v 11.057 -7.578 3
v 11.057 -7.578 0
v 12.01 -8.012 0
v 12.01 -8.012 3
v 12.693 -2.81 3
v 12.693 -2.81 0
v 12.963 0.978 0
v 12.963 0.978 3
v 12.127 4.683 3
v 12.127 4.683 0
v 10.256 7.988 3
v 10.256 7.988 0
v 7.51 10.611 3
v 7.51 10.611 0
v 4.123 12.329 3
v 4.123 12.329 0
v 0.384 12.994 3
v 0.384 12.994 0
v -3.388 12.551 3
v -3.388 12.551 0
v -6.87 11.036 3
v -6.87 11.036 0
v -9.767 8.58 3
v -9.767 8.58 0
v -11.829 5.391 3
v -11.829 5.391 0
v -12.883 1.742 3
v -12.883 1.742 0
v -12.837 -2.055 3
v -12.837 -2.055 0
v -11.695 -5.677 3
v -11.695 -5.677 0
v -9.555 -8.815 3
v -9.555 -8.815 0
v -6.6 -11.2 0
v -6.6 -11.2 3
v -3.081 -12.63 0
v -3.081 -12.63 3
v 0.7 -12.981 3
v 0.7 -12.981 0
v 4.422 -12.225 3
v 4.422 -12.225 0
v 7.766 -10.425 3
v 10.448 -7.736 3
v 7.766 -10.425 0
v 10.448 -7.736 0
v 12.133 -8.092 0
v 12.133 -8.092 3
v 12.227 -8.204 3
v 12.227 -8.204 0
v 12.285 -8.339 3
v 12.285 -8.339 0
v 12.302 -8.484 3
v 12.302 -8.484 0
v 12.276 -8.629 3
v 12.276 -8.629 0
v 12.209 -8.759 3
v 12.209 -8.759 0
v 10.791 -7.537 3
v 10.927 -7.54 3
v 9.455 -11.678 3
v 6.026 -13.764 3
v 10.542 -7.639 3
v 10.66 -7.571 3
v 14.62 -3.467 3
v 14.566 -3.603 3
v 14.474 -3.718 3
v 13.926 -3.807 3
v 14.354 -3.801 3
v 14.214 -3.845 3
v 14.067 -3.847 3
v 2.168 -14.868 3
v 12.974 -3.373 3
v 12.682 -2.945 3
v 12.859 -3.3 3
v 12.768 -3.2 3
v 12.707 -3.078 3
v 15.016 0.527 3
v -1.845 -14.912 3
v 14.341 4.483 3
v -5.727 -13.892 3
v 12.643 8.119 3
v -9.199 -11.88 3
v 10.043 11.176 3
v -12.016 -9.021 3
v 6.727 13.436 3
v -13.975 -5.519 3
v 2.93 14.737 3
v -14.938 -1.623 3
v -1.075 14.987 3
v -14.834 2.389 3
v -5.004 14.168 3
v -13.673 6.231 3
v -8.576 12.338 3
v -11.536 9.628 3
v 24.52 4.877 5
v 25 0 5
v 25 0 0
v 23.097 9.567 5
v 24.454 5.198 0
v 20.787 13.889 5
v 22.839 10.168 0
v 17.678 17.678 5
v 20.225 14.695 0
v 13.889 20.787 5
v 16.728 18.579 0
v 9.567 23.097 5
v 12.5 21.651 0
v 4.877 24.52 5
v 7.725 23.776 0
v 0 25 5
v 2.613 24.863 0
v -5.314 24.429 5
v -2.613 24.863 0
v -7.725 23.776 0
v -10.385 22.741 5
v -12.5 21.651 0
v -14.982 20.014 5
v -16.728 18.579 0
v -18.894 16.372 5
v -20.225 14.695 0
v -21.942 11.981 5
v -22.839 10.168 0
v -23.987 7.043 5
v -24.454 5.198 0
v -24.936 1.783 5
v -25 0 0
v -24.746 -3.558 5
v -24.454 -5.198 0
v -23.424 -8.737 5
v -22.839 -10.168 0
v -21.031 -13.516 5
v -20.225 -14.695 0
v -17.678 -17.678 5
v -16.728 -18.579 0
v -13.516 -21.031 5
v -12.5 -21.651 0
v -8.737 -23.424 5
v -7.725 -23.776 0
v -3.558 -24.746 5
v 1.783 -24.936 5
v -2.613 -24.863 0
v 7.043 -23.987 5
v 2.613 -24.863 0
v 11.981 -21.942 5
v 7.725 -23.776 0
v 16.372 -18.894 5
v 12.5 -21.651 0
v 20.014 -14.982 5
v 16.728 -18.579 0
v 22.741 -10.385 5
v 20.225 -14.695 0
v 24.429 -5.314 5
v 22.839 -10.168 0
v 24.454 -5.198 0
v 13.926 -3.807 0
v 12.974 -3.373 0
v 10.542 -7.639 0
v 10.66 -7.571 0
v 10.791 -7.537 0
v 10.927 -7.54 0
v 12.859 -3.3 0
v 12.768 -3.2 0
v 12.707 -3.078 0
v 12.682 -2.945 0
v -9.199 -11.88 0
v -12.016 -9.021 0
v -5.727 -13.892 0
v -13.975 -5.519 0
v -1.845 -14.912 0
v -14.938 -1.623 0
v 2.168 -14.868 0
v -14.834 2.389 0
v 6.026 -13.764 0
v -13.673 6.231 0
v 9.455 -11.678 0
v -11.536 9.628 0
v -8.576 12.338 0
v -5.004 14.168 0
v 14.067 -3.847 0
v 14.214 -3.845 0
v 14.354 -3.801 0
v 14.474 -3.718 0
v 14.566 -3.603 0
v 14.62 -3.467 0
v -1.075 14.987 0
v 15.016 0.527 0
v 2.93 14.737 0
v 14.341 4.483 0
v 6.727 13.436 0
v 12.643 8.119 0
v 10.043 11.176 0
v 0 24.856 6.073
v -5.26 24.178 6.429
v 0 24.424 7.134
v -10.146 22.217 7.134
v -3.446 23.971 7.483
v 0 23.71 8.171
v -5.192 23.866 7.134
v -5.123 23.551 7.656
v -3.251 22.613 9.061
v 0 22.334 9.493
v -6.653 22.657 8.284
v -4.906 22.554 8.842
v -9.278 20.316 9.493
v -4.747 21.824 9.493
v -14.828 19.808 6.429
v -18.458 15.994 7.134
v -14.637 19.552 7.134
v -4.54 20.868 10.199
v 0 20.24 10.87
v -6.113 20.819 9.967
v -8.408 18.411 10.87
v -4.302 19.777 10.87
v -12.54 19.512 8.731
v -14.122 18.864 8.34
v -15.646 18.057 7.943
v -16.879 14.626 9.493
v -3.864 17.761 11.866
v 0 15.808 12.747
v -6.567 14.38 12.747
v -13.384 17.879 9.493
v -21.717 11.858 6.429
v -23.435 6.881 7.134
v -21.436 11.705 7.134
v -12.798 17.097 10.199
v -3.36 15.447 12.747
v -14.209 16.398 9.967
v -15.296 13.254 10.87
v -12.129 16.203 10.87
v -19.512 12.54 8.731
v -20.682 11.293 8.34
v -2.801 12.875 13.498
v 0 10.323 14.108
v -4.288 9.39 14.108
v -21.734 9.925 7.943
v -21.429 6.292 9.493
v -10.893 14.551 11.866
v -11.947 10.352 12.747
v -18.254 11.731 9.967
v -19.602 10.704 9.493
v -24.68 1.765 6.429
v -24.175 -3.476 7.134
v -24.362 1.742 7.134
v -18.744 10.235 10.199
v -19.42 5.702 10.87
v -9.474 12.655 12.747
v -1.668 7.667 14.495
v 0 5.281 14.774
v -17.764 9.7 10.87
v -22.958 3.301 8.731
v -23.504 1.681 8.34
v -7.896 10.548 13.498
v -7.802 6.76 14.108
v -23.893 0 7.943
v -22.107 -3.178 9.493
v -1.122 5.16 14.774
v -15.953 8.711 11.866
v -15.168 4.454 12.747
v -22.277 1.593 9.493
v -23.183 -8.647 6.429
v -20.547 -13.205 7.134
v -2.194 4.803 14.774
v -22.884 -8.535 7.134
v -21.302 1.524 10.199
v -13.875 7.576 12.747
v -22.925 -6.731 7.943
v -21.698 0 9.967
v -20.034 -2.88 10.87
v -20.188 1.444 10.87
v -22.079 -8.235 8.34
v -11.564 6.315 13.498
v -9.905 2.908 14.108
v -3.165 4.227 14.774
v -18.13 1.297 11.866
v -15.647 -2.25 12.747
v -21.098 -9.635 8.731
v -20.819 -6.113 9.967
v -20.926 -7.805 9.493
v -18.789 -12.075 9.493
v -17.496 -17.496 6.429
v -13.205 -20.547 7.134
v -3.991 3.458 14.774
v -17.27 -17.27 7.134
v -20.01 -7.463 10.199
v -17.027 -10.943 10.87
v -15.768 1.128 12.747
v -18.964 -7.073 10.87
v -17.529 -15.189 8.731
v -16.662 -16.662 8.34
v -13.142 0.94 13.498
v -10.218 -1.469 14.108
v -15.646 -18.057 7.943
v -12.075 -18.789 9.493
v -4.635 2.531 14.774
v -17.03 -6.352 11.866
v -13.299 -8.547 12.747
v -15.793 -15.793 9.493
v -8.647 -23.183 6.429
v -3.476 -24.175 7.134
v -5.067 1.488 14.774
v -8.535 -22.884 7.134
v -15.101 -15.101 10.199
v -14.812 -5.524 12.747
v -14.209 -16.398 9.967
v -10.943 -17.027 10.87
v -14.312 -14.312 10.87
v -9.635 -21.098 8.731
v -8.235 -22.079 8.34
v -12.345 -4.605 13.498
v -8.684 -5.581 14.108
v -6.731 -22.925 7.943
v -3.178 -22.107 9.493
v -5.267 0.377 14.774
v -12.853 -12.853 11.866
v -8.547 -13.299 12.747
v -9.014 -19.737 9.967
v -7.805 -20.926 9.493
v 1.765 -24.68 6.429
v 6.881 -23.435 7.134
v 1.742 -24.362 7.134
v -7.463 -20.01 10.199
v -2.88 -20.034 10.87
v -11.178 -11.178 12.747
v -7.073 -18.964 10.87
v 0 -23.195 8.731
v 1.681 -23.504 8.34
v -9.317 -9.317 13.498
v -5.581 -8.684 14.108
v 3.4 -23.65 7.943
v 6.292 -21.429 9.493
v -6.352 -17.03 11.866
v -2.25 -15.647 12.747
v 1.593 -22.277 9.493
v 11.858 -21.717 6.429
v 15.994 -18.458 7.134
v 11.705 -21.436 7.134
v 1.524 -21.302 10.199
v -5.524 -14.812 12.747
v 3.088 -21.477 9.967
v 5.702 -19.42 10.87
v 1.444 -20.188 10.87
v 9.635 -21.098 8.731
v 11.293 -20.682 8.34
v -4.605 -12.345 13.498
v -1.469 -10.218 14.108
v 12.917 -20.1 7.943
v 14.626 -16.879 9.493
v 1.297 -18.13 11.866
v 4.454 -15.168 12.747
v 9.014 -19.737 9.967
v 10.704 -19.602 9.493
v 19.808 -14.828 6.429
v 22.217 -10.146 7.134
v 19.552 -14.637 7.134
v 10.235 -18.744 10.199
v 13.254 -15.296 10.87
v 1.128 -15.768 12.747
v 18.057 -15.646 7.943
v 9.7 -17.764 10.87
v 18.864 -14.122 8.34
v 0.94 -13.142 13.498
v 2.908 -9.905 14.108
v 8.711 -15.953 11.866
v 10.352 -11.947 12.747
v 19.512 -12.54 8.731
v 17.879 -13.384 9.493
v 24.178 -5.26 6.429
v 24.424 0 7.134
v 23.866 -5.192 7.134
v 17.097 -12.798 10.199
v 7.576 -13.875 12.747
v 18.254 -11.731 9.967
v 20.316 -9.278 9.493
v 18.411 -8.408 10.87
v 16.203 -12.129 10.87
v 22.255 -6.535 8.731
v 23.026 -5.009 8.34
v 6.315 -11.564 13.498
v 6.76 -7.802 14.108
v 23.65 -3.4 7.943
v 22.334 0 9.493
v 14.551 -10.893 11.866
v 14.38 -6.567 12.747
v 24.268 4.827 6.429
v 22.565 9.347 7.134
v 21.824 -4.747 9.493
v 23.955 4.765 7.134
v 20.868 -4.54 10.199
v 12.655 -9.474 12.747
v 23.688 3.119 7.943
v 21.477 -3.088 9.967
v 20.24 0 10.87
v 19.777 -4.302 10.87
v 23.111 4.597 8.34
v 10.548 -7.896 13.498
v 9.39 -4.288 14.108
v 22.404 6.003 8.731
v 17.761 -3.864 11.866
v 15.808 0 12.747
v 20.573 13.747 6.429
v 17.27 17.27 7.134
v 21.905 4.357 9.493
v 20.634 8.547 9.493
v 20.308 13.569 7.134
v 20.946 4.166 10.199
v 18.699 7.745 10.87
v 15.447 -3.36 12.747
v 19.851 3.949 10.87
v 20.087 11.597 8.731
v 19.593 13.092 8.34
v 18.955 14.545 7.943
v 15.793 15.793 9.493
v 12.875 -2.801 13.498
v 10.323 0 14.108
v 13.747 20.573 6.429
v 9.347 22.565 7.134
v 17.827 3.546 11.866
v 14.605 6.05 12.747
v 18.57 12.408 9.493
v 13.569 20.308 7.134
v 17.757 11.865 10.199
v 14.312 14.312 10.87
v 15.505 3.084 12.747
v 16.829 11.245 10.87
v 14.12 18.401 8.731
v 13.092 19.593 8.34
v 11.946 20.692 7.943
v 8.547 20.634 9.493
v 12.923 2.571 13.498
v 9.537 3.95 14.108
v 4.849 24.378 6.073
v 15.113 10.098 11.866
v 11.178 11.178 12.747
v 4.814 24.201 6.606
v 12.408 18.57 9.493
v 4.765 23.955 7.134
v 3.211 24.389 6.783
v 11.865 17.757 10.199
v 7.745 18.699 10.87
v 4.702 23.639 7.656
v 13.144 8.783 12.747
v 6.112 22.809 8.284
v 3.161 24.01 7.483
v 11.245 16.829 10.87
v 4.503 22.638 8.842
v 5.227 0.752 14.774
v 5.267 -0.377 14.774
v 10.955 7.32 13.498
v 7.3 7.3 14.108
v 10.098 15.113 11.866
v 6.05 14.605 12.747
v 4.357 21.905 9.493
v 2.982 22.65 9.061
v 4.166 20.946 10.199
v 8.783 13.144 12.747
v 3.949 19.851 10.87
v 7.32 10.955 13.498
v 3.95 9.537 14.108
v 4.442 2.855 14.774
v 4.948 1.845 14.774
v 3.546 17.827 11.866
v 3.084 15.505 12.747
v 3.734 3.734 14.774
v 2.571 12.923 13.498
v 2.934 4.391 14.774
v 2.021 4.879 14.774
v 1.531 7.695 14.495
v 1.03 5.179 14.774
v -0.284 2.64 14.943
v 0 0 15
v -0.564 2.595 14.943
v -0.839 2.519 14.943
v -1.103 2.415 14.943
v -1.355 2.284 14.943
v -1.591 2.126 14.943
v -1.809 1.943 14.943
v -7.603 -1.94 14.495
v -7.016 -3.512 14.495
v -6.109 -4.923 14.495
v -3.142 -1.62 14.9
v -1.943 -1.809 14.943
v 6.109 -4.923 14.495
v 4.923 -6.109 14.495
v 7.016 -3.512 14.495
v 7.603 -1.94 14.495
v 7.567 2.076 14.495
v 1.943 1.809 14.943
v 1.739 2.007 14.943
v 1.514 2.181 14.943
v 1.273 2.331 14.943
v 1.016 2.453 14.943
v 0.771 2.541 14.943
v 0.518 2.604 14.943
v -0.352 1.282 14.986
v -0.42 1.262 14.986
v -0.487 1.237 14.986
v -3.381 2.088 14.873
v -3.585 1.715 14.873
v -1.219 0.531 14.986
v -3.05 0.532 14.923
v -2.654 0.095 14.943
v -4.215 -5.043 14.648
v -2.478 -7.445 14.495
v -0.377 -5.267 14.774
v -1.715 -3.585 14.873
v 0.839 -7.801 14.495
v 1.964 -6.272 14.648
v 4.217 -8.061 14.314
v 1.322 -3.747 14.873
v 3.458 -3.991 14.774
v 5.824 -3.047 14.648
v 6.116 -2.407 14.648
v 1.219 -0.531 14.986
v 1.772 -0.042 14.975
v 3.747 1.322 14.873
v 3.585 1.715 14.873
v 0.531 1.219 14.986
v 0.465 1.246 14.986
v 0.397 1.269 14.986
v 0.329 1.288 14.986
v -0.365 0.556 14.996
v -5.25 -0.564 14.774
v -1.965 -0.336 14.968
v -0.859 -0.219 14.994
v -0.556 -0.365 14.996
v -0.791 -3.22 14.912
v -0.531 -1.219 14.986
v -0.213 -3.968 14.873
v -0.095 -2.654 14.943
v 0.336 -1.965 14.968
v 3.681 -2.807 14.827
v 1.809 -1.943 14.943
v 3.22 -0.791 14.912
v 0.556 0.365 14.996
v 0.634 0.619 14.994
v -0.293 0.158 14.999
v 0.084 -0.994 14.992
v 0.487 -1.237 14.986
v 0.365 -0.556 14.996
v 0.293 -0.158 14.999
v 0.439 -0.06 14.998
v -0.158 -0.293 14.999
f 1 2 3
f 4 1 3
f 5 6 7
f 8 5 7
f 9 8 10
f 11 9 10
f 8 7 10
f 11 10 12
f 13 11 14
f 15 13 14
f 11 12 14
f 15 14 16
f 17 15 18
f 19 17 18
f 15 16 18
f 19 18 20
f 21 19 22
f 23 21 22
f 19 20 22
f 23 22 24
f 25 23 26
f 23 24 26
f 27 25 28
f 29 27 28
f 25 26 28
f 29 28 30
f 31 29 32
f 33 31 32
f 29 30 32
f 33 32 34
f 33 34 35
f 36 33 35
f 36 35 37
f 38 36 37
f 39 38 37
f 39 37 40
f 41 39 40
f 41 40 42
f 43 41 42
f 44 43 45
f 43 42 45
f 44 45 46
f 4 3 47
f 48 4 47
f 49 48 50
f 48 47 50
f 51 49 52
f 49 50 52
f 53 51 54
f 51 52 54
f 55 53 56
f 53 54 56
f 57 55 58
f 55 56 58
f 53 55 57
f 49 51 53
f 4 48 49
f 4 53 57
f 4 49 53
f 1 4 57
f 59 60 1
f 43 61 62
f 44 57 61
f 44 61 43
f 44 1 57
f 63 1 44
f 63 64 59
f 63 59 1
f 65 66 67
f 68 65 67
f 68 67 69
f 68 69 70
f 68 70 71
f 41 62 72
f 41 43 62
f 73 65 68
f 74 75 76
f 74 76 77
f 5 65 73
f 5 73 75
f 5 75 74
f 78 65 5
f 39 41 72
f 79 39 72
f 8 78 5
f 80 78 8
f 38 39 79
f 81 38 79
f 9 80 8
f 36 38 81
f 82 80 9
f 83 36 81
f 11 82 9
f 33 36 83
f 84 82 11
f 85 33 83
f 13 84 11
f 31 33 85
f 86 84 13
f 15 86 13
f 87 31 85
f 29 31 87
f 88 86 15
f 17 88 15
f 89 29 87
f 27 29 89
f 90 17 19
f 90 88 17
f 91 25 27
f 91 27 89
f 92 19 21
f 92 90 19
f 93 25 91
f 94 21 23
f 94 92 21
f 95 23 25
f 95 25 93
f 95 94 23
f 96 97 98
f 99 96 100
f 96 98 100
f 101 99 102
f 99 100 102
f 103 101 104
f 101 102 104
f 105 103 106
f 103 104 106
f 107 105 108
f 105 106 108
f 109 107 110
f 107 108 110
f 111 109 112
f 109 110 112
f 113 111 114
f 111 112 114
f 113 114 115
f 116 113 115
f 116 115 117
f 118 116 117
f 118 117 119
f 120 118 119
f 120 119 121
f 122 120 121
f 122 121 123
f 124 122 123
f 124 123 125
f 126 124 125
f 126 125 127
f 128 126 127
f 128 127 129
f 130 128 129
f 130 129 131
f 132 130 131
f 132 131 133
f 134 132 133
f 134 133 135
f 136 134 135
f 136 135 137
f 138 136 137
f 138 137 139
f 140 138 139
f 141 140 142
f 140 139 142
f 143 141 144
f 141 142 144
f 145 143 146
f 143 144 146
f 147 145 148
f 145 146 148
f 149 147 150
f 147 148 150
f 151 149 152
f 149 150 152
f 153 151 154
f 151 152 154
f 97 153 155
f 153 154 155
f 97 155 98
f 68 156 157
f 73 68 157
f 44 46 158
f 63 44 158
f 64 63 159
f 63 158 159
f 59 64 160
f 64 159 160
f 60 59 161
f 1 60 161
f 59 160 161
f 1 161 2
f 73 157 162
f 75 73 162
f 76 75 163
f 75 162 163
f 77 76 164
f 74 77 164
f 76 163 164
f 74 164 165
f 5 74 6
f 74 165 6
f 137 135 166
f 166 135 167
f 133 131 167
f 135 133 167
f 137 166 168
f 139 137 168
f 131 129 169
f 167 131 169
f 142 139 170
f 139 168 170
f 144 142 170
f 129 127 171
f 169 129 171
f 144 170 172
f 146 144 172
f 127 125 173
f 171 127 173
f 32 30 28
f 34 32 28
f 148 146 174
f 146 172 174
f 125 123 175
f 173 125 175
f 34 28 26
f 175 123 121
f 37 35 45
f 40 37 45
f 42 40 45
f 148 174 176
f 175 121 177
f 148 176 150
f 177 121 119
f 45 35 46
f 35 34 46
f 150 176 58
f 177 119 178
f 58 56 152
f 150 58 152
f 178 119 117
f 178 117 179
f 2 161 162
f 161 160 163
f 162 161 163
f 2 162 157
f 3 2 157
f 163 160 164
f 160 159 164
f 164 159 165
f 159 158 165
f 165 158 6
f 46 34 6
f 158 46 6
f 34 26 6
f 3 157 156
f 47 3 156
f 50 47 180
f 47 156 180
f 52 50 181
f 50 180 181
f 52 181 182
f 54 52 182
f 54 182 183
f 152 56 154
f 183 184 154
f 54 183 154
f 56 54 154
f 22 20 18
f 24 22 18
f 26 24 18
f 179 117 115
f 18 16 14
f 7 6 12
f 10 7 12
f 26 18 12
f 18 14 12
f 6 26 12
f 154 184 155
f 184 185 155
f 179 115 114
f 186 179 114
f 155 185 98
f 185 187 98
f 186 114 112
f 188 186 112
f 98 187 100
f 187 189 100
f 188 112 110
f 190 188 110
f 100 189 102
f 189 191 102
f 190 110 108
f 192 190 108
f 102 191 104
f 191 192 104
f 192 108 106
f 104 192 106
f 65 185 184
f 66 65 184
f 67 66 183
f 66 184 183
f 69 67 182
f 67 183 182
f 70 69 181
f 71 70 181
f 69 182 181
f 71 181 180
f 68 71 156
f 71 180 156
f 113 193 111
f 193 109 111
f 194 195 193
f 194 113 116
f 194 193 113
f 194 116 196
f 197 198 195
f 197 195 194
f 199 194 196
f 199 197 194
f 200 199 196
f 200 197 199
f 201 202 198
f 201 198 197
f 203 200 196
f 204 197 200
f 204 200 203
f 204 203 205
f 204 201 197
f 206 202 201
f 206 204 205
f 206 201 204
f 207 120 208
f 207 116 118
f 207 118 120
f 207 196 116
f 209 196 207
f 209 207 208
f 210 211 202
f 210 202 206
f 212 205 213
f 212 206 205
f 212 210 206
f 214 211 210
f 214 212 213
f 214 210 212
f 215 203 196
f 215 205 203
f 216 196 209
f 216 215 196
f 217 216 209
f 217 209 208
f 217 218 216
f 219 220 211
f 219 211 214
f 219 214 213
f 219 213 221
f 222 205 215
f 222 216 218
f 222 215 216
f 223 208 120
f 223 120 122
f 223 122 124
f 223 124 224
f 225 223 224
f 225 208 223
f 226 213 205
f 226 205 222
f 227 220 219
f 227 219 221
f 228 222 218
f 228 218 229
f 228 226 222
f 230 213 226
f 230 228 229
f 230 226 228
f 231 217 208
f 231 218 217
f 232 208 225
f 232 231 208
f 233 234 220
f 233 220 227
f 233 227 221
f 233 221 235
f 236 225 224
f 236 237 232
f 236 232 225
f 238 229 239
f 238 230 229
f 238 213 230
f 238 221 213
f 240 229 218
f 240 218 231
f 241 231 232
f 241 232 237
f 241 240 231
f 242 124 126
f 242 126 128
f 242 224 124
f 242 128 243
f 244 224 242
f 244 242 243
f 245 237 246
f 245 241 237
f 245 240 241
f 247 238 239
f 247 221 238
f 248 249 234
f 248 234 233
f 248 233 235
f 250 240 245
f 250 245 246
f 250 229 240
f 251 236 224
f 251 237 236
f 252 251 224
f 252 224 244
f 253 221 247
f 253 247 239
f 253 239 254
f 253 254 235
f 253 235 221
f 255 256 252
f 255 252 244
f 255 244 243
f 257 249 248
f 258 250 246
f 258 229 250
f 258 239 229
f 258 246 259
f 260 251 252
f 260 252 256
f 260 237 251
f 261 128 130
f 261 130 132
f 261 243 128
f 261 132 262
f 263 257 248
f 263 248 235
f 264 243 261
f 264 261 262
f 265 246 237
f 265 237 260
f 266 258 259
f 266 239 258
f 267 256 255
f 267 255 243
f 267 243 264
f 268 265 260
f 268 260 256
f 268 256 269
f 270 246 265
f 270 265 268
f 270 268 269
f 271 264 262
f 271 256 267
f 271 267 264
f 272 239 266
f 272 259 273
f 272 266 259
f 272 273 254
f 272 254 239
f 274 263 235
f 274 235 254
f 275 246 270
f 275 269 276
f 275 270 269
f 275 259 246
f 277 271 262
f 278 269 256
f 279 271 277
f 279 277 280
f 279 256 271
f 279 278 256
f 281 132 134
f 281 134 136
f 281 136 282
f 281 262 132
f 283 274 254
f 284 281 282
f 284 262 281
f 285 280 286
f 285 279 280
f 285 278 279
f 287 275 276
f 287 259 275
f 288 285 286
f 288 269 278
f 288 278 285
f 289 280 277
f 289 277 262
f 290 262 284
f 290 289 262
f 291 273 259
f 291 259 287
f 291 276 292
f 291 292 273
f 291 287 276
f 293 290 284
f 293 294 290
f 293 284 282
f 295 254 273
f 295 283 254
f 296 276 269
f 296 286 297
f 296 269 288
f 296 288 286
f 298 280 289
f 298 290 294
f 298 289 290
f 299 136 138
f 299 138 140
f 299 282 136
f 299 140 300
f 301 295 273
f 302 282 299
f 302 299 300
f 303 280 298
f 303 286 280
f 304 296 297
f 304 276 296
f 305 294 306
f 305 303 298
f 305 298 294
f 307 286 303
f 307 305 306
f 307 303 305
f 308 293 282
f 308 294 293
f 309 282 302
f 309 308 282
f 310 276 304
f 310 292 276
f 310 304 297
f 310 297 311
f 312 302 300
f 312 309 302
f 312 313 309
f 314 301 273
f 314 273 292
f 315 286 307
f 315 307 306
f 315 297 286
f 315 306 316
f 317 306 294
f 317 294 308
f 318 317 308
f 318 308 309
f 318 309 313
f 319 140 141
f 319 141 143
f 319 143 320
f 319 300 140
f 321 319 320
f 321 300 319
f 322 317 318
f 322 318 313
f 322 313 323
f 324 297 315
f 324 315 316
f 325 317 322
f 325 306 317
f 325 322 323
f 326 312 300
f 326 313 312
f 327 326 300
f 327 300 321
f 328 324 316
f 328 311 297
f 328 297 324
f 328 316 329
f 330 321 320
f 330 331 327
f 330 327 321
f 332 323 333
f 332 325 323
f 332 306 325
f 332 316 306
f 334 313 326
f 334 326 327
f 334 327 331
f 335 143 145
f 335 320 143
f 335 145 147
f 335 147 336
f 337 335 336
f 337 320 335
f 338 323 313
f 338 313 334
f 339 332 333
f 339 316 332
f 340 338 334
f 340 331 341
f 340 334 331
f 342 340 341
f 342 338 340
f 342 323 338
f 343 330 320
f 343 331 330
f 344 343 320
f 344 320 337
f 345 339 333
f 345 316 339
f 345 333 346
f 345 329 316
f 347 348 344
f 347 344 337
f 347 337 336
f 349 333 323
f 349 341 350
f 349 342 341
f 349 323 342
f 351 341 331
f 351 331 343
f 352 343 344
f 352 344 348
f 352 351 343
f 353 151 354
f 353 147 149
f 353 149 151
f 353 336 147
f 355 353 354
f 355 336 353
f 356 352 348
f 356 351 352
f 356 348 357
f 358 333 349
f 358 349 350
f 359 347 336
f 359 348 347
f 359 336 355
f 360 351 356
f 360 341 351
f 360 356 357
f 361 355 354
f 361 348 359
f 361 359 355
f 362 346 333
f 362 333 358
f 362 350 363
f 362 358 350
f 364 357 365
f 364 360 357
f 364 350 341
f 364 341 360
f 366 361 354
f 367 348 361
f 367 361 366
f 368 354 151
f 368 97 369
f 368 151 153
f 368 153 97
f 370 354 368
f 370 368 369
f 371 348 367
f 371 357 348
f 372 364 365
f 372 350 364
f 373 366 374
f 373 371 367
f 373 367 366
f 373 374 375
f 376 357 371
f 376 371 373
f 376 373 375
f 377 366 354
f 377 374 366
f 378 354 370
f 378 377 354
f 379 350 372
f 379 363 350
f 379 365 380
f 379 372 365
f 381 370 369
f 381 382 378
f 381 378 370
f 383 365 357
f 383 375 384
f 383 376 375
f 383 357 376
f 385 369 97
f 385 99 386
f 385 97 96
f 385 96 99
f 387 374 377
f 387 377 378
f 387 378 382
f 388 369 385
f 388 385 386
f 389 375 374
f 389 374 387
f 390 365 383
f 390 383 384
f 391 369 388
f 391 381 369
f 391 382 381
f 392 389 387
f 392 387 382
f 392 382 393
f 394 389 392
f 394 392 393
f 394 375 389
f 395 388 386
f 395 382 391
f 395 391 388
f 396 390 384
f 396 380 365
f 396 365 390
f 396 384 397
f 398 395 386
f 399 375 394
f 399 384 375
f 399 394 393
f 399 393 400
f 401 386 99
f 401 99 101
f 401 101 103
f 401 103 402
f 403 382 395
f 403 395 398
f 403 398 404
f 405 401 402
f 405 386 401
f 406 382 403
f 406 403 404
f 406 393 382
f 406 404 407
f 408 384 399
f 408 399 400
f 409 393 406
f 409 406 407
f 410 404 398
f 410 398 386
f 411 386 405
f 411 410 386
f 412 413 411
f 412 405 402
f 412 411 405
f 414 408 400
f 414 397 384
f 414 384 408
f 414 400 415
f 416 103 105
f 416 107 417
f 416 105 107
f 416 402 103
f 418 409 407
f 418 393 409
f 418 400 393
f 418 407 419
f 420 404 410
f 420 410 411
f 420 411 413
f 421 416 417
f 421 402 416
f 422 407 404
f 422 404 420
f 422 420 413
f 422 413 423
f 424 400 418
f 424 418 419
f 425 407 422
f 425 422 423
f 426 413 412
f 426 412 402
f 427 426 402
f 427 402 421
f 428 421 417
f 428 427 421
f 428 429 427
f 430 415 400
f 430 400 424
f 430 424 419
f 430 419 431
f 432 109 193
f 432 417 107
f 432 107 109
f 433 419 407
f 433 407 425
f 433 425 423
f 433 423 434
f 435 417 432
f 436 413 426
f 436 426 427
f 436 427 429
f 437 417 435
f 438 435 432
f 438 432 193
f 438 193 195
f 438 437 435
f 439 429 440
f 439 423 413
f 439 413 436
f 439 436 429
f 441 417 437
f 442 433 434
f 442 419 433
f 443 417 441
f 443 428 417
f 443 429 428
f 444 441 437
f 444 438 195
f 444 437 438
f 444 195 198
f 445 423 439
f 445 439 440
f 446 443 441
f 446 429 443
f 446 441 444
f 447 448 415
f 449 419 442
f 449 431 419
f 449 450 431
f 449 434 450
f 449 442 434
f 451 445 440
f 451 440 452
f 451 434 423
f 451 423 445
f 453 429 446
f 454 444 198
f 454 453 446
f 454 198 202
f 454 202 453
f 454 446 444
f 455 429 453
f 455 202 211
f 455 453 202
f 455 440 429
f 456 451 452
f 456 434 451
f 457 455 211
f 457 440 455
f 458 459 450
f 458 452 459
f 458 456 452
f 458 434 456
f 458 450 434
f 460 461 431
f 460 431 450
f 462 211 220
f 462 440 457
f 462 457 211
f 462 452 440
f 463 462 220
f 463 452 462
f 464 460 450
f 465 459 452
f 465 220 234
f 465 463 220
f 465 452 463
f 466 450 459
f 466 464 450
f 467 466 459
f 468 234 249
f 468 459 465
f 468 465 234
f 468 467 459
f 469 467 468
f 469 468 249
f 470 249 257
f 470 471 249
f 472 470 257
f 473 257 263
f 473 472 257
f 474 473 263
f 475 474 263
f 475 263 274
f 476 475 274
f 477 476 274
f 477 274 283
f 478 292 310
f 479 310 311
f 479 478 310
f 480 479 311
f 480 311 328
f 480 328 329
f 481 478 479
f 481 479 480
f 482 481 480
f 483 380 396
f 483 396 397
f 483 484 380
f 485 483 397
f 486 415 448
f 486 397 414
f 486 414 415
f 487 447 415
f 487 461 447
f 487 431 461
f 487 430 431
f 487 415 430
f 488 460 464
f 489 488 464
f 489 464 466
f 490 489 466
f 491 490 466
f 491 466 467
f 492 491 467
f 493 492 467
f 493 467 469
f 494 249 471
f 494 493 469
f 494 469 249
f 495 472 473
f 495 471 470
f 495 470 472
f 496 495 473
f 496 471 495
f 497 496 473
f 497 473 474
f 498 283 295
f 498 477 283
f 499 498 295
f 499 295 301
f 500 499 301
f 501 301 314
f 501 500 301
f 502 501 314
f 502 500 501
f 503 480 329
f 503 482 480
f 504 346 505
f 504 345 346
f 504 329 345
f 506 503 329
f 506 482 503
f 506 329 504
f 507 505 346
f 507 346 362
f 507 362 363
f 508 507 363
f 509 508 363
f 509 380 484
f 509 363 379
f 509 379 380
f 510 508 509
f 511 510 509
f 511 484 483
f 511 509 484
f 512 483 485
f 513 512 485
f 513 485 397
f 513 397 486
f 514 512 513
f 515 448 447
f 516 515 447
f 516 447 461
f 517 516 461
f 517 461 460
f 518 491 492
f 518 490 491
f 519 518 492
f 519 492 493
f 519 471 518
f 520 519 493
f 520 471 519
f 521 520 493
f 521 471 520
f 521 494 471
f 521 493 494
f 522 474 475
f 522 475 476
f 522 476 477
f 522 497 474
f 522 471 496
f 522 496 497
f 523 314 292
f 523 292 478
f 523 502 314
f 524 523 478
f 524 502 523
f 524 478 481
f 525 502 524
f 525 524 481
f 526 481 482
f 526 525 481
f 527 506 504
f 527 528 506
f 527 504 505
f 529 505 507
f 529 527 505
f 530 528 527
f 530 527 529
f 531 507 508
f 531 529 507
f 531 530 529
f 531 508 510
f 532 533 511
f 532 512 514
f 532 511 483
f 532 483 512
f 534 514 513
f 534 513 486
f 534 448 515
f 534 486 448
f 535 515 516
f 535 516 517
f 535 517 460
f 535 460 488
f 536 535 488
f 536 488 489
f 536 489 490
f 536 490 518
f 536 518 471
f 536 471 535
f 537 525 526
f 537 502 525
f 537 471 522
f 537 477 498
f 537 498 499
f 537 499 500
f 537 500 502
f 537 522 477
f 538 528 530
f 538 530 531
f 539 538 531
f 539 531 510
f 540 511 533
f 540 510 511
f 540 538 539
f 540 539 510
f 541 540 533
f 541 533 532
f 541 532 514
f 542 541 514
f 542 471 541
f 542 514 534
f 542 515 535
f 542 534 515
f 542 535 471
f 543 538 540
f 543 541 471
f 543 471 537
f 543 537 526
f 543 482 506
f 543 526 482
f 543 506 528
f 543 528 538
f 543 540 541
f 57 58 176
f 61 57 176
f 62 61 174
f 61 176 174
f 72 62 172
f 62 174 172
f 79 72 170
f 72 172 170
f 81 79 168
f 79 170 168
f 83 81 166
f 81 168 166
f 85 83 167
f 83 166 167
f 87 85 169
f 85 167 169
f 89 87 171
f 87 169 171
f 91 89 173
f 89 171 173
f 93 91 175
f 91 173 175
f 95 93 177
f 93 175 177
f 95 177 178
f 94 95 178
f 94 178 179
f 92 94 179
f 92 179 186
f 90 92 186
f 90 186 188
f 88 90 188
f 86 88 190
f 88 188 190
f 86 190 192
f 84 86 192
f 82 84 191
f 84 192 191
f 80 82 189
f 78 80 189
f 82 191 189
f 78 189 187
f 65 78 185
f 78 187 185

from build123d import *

# Parameters (mm, degrees)
ESQUISSE1_R             = 25
BOSS_EXTRU_1_DEPTH      = 5
ENL_V_MAT_EXTRU_1_DEPTH = 3
D_ME1_FACE_RADIUS       = 25
D_ME1_HEIGHT            = 10


with BuildPart() as part:
    # Esquisse1 → Boss.-Extru.1 (new body)
    with BuildSketch(Plane.XY):
        Circle(ESQUISSE1_R)
    extrude(amount=BOSS_EXTRU_1_DEPTH)

    # Esquisse1<7> → Enlèv. mat.-Extru.1 (cut)
    with BuildSketch(Plane.XY):
        with BuildLine():
            Line((13.926414777, -3.806711623), (12.973693151, -3.372870175))
            ThreePointArc((12.973693151, -3.372870175), (12.733506213, -3.141062984), (12.692724073, -2.809760772))
            ThreePointArc((12.692724073, -2.809760772), (-11.829492988, 5.391019908), (10.447719463, -7.735965229))
            ThreePointArc((10.447719463, -7.735965229), (10.724383559, -7.549423688), (11.056794316, -7.57847291))
            Line((11.056794316, -7.57847291), (12.009590144, -8.012416083))
            ThreePointArc((12.009590144, -8.012416083), (12.285475329, -8.338641219), (12.208610947, -8.758911776))
            ThreePointArc((12.208610947, -8.758911776), (-13.672833437, 6.230757786), (14.62013485, -3.467041062))
            ThreePointArc((14.62013485, -3.467041062), (14.353503323, -3.8007296), (13.926414777, -3.806711623))
        make_face()
    extrude(amount=ENL_V_MAT_EXTRU_1_DEPTH, mode=Mode.SUBTRACT)

    # Dôme1: an elliptical dome of height H over a round flat face of radius A is half a spheroid: the quarter ellipse of half axes A and H revolved about the face's axis
    with BuildSketch(Plane((0, 0, 5), x_dir=(0, 1, 0), z_dir=(1, 0, 0)), mode=Mode.PRIVATE) as d_me1_quarter:
        Ellipse(D_ME1_FACE_RADIUS, D_ME1_HEIGHT)
        Rectangle(D_ME1_FACE_RADIUS, D_ME1_HEIGHT, align=(Align.MIN, Align.MIN), mode=Mode.INTERSECT)
    revolve(d_me1_quarter.sketch, axis=Axis((0, 0, 5), (0, 0, 1)))


solid = part.part
